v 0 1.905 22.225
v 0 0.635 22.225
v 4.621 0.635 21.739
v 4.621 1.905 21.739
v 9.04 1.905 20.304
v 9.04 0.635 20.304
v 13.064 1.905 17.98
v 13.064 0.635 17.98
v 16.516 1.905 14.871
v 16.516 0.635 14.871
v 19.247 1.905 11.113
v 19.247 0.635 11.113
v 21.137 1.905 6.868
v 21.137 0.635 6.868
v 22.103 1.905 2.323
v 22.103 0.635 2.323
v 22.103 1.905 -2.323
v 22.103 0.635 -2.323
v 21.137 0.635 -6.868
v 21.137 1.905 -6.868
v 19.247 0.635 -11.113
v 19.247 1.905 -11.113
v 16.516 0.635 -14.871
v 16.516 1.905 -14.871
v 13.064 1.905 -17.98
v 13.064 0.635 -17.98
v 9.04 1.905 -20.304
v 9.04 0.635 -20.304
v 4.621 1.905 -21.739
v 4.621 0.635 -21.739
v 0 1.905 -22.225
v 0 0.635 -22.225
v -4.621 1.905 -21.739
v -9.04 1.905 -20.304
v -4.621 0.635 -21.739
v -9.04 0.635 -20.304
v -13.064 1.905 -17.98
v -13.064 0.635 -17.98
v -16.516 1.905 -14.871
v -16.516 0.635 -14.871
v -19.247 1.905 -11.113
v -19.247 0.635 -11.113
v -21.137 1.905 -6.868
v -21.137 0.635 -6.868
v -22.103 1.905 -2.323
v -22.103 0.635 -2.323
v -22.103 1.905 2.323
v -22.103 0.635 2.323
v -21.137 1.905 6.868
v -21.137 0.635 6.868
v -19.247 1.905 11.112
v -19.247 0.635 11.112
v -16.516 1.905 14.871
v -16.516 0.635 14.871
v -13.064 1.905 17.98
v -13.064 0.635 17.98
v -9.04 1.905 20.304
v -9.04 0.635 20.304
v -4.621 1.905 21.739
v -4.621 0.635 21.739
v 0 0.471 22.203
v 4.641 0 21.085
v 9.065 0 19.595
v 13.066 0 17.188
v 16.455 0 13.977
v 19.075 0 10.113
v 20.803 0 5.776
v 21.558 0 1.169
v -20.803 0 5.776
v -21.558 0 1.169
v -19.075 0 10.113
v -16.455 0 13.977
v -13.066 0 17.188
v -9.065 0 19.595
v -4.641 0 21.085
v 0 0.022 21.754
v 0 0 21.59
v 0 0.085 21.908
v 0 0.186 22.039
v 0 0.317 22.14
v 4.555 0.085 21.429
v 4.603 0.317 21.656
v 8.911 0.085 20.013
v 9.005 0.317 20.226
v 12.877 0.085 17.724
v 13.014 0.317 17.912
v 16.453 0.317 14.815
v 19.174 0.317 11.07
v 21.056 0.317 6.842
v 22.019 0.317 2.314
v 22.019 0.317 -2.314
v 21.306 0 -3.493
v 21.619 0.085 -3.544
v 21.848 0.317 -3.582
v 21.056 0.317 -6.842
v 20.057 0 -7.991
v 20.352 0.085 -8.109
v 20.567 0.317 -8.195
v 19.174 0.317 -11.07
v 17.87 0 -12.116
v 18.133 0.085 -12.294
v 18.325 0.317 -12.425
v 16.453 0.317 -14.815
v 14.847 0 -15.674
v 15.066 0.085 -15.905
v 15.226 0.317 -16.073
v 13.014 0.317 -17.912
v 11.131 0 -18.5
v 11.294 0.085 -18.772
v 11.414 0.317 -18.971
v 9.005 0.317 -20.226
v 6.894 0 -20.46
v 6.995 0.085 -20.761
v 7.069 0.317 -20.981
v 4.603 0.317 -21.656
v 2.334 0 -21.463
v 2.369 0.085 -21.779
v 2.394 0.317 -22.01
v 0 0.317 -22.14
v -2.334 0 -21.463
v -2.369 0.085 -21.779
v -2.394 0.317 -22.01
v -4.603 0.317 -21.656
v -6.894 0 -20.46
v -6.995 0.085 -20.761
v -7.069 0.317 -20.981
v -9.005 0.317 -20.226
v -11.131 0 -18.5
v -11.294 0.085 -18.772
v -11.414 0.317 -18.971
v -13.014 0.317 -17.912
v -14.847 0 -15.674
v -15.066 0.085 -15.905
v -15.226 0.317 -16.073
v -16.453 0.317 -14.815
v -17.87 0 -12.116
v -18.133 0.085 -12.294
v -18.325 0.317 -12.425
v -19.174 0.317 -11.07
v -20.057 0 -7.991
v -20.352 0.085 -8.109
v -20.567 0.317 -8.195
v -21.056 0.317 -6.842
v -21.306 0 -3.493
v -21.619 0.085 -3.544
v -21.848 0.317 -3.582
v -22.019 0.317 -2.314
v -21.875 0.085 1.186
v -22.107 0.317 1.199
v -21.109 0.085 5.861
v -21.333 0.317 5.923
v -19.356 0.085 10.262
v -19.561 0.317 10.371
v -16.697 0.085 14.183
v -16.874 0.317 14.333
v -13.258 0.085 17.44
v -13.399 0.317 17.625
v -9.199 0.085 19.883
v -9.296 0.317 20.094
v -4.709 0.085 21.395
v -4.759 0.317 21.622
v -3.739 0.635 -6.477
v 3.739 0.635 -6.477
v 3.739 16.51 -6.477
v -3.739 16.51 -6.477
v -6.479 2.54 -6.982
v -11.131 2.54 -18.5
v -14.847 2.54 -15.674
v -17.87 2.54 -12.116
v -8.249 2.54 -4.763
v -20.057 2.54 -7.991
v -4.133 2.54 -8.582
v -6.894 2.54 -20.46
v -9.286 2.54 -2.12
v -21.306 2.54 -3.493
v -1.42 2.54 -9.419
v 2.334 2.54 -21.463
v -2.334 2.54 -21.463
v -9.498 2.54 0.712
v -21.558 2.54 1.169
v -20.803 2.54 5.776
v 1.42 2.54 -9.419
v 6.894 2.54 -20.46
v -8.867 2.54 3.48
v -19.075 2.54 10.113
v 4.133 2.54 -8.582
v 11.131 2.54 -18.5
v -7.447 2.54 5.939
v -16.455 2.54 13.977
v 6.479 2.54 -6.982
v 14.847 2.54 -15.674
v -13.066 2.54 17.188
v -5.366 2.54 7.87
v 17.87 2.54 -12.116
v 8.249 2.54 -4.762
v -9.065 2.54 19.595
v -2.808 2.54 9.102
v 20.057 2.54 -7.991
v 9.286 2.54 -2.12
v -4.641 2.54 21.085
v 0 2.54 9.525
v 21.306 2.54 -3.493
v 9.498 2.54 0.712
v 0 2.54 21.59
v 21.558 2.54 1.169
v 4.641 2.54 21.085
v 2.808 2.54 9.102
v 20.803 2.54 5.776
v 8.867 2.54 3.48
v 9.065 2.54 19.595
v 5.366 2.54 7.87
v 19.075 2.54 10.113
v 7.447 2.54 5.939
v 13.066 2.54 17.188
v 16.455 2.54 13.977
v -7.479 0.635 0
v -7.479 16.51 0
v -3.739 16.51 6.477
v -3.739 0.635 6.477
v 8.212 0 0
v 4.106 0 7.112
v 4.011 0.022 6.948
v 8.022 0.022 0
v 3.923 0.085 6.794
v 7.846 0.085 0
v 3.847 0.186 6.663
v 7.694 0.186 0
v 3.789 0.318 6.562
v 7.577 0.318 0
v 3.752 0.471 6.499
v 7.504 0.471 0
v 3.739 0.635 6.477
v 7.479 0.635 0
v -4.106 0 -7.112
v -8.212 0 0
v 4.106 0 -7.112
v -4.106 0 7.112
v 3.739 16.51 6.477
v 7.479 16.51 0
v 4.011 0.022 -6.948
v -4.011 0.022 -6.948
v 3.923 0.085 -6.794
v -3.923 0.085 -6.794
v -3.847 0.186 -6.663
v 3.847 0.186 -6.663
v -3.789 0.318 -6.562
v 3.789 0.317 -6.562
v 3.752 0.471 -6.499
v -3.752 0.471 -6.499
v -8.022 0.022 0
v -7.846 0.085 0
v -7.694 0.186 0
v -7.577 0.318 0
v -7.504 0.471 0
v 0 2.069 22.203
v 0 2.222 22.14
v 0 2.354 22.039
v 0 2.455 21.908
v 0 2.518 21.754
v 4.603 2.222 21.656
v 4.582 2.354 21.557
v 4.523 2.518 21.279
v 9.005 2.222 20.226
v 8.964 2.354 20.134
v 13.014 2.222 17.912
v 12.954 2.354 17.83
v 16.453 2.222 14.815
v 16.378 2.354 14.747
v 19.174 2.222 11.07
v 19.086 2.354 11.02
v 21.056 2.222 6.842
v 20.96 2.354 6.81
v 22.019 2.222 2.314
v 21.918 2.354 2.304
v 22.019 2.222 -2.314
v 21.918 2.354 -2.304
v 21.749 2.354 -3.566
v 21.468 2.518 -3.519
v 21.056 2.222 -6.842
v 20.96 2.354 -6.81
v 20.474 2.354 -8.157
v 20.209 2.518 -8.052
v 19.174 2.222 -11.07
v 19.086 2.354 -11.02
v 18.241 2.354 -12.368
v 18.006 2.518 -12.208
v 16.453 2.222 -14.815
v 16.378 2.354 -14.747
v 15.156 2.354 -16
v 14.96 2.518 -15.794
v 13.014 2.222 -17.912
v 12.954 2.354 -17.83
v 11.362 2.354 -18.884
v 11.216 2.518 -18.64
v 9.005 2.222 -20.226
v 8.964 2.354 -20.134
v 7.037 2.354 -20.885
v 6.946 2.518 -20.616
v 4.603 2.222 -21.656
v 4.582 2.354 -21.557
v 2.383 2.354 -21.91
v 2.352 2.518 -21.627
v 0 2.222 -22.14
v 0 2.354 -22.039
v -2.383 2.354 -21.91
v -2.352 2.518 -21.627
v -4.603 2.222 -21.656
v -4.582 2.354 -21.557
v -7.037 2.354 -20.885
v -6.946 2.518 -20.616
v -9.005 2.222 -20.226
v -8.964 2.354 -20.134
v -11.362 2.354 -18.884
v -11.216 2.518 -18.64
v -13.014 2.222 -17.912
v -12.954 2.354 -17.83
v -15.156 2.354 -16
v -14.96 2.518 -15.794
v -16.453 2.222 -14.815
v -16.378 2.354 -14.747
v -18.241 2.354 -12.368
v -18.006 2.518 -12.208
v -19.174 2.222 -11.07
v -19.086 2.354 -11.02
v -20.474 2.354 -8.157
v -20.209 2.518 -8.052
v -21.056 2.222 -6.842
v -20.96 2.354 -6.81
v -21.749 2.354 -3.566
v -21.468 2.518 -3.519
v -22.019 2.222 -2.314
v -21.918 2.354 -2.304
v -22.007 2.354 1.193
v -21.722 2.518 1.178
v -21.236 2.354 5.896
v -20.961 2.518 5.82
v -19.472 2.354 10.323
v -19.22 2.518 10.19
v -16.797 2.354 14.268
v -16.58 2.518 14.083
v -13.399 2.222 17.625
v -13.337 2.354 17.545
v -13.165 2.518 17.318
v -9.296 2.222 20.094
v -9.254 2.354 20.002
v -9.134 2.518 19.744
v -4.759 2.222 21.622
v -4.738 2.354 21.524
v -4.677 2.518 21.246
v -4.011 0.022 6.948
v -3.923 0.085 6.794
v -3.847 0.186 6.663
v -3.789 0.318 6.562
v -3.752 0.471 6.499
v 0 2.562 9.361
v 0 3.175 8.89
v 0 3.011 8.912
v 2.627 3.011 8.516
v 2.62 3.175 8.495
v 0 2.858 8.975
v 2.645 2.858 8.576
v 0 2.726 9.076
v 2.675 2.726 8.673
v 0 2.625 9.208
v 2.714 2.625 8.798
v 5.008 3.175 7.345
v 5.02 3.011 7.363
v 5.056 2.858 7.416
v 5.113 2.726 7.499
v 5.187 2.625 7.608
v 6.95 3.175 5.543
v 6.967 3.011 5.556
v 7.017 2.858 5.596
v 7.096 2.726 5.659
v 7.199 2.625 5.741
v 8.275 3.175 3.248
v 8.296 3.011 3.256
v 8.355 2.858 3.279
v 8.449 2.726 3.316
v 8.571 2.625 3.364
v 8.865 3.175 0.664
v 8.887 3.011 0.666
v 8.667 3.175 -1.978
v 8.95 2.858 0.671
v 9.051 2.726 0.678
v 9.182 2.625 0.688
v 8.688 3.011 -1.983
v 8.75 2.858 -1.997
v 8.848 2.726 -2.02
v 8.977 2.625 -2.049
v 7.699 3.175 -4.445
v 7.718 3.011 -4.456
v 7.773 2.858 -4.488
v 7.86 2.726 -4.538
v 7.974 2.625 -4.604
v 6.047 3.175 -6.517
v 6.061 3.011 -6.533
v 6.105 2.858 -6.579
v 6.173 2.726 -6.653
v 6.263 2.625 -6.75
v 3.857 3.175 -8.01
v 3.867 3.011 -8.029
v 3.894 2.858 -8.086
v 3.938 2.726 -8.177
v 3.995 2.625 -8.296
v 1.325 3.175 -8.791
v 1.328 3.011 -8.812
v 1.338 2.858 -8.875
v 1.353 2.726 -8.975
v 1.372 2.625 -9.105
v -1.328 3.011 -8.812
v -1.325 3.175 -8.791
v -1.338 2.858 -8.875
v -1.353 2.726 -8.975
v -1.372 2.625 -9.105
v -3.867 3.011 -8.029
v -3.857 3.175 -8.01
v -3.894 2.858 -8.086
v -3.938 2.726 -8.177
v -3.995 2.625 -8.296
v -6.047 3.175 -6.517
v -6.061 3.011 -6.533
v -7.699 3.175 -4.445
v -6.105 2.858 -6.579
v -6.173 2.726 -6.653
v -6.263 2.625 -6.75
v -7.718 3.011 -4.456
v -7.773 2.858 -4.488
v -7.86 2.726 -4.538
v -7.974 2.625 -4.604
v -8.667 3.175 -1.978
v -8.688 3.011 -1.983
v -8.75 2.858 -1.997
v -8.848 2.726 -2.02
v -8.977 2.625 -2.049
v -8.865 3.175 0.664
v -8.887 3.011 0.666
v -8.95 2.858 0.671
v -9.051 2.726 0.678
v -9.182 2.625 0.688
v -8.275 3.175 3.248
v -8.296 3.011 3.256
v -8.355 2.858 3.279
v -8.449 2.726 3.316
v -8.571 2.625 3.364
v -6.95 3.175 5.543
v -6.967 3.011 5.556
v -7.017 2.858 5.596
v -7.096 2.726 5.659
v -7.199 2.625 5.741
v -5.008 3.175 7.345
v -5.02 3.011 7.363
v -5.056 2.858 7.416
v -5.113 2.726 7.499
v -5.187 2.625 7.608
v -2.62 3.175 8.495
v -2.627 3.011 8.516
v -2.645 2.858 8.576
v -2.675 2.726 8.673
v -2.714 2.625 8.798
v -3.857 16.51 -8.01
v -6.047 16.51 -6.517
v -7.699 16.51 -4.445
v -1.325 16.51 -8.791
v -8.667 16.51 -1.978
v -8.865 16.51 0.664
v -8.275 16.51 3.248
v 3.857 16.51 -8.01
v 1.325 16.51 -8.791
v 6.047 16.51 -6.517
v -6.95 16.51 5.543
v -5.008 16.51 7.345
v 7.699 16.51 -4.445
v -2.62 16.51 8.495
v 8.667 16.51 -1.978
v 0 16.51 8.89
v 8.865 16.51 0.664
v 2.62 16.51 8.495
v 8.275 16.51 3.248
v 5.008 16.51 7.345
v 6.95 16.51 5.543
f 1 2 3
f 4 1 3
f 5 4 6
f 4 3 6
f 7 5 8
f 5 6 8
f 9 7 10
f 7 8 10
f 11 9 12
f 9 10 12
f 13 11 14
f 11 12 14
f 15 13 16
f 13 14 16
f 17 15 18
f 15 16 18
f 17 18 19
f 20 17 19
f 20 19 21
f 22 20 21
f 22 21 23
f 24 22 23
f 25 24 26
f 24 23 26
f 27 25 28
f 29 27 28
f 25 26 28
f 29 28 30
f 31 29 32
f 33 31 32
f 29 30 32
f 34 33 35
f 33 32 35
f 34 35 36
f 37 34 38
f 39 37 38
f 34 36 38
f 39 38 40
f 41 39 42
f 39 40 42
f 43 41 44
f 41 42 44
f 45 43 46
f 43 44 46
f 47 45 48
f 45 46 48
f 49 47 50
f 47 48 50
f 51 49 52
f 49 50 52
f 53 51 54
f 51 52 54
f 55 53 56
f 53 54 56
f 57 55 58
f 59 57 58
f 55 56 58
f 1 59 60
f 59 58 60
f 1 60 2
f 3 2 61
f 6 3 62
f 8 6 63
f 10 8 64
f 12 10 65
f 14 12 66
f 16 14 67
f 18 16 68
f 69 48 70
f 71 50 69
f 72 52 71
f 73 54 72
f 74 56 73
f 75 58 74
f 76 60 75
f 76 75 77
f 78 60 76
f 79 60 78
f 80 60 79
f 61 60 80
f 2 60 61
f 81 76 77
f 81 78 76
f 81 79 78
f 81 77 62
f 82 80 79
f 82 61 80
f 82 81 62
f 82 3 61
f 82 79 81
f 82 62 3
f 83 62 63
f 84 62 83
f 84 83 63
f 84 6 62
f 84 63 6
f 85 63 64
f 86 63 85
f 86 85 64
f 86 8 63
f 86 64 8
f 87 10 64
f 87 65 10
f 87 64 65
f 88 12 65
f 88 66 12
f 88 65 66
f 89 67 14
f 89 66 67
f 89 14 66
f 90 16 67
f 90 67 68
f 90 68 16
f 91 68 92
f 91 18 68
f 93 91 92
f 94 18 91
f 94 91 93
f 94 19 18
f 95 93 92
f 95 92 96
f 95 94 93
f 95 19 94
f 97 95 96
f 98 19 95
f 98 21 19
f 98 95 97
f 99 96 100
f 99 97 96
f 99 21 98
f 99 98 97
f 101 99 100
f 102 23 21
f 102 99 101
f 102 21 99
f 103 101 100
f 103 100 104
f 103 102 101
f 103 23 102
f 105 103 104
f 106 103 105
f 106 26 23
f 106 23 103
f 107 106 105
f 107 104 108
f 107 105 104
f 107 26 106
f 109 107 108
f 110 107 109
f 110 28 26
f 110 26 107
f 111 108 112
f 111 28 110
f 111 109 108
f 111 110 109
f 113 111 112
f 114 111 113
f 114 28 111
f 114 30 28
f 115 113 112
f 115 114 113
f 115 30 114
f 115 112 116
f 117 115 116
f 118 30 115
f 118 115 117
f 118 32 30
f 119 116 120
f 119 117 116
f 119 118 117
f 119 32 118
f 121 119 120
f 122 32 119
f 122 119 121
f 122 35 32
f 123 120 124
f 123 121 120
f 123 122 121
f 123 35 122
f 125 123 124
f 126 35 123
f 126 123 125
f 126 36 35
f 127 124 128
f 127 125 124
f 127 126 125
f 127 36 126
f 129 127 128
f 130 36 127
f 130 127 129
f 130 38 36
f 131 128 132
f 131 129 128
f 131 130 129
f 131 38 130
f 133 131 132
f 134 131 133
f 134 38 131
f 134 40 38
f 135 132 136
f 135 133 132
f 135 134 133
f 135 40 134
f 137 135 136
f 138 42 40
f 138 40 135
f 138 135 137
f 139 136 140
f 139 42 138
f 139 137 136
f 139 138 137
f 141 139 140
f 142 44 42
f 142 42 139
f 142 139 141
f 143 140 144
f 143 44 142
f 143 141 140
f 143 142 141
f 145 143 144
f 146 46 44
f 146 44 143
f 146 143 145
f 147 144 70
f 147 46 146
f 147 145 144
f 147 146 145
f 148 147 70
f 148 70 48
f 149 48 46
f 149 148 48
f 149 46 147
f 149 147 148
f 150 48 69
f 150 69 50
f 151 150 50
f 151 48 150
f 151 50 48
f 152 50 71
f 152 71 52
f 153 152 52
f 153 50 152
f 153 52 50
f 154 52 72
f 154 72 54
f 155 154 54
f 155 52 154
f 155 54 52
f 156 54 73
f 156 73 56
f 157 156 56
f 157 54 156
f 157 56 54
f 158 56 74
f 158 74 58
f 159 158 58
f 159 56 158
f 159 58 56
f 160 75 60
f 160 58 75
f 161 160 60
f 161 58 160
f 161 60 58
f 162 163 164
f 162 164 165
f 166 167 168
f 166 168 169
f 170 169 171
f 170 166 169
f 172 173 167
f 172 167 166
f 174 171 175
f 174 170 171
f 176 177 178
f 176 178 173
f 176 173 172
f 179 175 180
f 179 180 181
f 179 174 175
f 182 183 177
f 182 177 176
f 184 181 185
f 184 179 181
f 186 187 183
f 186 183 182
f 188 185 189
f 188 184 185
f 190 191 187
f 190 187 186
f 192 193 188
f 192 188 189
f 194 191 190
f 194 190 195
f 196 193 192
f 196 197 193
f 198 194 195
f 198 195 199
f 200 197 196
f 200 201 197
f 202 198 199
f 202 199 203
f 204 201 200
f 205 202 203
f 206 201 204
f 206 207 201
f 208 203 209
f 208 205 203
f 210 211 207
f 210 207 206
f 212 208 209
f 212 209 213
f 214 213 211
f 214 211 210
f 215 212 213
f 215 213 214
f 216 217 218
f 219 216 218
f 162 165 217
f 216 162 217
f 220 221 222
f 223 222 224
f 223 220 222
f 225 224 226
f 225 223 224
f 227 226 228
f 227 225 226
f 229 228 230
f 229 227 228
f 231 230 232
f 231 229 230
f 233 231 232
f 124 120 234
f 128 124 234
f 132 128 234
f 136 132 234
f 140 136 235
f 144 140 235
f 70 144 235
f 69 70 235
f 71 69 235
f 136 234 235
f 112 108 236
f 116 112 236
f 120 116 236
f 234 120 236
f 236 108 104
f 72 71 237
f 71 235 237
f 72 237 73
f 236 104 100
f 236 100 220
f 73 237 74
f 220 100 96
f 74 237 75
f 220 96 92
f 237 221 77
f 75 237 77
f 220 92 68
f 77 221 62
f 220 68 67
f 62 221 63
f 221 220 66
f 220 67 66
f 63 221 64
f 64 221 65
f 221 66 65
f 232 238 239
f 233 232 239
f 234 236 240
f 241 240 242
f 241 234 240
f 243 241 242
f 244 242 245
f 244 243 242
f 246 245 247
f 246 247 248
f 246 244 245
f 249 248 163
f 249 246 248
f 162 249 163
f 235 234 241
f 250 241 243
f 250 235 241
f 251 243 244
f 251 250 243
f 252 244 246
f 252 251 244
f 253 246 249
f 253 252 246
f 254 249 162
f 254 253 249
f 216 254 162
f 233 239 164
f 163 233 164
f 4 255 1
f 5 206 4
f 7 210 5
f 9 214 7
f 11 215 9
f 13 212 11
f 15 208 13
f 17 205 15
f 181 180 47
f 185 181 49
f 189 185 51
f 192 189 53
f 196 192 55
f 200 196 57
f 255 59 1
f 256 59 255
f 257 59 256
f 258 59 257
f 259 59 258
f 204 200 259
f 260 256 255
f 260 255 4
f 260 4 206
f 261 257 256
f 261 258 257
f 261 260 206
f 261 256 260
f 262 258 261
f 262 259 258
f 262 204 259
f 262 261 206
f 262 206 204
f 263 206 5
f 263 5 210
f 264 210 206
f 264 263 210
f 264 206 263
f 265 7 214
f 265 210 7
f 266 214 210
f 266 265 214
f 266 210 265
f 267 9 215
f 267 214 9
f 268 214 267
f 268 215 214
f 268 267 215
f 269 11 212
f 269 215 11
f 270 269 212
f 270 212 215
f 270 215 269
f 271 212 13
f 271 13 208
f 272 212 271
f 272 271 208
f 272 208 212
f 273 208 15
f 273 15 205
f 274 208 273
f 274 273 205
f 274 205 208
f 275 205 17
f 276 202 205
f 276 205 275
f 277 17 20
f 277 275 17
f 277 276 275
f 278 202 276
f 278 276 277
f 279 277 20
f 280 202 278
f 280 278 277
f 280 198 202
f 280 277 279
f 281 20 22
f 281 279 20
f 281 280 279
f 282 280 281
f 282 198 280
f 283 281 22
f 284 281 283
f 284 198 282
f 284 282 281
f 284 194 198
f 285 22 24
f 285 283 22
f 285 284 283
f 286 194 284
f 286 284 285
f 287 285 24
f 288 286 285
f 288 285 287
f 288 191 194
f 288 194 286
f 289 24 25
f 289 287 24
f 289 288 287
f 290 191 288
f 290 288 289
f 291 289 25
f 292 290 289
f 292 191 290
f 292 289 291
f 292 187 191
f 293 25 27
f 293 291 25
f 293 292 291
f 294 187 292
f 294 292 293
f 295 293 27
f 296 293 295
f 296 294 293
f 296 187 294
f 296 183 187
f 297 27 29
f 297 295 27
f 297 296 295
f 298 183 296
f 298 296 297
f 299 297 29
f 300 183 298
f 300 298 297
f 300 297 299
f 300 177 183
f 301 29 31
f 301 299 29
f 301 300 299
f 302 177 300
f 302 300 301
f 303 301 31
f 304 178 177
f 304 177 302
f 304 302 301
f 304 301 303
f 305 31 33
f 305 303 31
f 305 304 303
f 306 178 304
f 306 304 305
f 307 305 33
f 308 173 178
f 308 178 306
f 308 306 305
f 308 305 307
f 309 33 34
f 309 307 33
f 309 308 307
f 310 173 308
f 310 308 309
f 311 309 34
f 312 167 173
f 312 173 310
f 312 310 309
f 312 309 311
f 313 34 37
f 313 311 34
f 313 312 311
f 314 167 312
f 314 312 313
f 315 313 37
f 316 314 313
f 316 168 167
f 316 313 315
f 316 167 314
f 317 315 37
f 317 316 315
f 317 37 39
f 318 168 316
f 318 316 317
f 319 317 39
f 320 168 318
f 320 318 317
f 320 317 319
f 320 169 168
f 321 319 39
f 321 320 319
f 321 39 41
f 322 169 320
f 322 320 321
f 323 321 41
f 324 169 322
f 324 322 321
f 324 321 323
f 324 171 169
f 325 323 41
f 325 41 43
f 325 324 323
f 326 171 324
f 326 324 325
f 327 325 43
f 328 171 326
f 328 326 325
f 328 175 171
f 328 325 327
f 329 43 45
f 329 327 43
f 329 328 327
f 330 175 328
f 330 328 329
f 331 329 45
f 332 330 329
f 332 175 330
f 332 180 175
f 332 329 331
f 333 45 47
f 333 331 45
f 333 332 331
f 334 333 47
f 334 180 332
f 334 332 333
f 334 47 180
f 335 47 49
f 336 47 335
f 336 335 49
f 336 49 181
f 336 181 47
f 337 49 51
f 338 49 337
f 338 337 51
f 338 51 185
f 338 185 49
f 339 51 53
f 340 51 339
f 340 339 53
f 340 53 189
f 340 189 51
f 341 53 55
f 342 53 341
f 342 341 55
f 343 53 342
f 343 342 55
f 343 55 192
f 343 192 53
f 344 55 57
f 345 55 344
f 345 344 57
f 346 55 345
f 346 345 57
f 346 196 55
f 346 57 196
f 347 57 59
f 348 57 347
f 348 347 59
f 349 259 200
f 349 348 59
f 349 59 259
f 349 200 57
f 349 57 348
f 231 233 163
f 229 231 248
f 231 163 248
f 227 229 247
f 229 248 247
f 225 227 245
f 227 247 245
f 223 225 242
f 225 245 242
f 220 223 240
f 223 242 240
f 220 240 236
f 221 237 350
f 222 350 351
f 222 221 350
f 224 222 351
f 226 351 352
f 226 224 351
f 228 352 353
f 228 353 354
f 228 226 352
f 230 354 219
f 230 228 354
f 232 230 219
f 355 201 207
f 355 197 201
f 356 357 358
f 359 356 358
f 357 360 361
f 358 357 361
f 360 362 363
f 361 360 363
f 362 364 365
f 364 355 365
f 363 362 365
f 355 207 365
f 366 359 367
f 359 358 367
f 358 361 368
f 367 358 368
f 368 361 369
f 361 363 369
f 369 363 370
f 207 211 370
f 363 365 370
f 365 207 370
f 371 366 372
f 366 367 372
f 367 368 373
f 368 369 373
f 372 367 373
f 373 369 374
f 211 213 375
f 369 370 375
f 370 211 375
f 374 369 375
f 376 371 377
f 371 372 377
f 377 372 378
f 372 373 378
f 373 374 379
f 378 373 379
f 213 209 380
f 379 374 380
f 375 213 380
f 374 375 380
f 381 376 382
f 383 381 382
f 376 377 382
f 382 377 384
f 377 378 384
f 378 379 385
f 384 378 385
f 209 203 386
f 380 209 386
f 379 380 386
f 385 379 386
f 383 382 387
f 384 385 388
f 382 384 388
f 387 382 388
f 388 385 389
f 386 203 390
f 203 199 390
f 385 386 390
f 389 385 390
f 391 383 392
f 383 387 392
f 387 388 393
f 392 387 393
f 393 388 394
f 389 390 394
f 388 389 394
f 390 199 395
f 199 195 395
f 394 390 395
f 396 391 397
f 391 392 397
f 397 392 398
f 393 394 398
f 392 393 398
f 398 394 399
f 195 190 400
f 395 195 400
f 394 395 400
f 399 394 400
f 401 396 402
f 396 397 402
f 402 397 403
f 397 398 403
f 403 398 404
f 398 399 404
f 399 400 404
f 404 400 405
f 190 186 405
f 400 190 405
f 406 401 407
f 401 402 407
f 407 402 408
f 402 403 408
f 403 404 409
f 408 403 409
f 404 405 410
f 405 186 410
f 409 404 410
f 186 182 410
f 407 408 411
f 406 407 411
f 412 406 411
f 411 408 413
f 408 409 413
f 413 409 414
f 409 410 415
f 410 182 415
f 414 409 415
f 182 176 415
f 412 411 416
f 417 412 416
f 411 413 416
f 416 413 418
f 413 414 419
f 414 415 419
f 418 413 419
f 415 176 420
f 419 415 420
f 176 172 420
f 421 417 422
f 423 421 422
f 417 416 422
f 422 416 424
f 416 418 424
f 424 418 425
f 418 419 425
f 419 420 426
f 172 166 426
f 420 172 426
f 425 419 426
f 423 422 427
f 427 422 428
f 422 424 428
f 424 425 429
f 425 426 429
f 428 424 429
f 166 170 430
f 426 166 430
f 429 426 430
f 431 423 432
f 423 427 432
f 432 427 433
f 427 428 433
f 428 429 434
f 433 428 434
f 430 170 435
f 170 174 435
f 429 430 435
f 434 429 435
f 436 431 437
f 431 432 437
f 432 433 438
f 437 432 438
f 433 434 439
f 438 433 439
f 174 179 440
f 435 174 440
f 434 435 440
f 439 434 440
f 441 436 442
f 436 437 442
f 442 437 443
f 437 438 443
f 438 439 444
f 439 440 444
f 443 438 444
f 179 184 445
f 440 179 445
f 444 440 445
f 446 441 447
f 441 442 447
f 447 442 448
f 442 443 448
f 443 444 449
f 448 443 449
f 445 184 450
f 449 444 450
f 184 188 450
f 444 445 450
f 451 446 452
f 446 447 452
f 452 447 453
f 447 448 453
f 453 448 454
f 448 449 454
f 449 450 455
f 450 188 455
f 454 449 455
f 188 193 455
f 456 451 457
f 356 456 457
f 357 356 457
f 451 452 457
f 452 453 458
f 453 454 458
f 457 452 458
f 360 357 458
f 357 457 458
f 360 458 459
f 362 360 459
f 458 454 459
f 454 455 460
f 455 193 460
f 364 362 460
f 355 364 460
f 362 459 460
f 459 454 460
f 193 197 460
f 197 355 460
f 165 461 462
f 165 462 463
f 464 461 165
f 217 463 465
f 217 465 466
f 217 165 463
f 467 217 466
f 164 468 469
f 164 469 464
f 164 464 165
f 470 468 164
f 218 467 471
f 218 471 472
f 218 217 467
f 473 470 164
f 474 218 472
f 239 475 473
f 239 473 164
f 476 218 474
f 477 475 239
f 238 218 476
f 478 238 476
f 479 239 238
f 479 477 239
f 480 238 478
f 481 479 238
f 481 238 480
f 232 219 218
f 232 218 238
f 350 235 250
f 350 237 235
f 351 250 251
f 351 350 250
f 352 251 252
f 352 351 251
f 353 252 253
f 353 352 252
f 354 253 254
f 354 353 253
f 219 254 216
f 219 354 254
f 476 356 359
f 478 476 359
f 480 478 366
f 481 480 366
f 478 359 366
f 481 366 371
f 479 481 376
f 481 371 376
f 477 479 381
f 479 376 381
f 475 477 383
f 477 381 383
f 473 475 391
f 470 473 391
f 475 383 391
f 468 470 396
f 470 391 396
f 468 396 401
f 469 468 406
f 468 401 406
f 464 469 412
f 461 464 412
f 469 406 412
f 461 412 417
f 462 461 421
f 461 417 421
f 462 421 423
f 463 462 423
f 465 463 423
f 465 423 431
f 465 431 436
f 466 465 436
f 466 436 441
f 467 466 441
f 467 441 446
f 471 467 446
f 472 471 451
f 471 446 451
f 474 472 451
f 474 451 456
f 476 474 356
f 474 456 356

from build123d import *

# Parameters (mm, degrees)
SKETCH1_R           = 22.225
BOSS_EXTRUDE1_DEPTH = 2.54
SKETCH2_R           = 8.89
BOSS_EXTRUDE2_DEPTH = 13.97
FILLET1_R           = 0.635


with BuildPart() as part:
    # Sketch1 → Boss-Extrude1 (new body)
    with BuildSketch(Plane(origin=(0, 0, 0), x_dir=(1, 0, 0), z_dir=(0, 1, 0))):
        with Locations(Location((0, 0, 0), (0, 0, 270))):
            Circle(SKETCH1_R)
        Polygon((7.478995387, 0), (3.739497694, 6.477), (-3.739497694, 6.477), (-7.478995387, 0), (-3.739497694, -6.477), (3.739497694, -6.477), align=None, mode=Mode.SUBTRACT)
    extrude(amount=BOSS_EXTRUDE1_DEPTH)

    # Sketch2 → Boss-Extrude2 (add)
    with BuildSketch(Plane(origin=(0, 2.54, 0), x_dir=(1, 0, 0), z_dir=(0, 1, 0))):
        with Locations(Location((0, 0, 0), (0, 0, 270))):
            Circle(SKETCH2_R)
        Polygon((3.739497694, 6.477), (-3.739497694, 6.477), (-7.478995387, 0), (-3.739497694, -6.477), (3.739497694, -6.477), (7.478995387, 0), align=None, mode=Mode.SUBTRACT)
    extrude(amount=BOSS_EXTRUDE2_DEPTH)

    # Fillet1
    fillet1_edges = [part.edges().sort_by_distance(p)[0] for p in [
        (0, 0, -6.477),
        (-5.60924654, 0, -3.2385),
        (-5.60924654, 0, 3.2385),
        (0, 0, 6.477),
        (0, 0, -22.225),
        (0, 2.54, -8.89),
        (0, 2.54, -22.225),
        (5.60924654, 0, 3.2385),
        (5.60924654, 0, -3.2385),
    ]]
    fillet(fillet1_edges, radius=FILLET1_R)


solid = part.part
